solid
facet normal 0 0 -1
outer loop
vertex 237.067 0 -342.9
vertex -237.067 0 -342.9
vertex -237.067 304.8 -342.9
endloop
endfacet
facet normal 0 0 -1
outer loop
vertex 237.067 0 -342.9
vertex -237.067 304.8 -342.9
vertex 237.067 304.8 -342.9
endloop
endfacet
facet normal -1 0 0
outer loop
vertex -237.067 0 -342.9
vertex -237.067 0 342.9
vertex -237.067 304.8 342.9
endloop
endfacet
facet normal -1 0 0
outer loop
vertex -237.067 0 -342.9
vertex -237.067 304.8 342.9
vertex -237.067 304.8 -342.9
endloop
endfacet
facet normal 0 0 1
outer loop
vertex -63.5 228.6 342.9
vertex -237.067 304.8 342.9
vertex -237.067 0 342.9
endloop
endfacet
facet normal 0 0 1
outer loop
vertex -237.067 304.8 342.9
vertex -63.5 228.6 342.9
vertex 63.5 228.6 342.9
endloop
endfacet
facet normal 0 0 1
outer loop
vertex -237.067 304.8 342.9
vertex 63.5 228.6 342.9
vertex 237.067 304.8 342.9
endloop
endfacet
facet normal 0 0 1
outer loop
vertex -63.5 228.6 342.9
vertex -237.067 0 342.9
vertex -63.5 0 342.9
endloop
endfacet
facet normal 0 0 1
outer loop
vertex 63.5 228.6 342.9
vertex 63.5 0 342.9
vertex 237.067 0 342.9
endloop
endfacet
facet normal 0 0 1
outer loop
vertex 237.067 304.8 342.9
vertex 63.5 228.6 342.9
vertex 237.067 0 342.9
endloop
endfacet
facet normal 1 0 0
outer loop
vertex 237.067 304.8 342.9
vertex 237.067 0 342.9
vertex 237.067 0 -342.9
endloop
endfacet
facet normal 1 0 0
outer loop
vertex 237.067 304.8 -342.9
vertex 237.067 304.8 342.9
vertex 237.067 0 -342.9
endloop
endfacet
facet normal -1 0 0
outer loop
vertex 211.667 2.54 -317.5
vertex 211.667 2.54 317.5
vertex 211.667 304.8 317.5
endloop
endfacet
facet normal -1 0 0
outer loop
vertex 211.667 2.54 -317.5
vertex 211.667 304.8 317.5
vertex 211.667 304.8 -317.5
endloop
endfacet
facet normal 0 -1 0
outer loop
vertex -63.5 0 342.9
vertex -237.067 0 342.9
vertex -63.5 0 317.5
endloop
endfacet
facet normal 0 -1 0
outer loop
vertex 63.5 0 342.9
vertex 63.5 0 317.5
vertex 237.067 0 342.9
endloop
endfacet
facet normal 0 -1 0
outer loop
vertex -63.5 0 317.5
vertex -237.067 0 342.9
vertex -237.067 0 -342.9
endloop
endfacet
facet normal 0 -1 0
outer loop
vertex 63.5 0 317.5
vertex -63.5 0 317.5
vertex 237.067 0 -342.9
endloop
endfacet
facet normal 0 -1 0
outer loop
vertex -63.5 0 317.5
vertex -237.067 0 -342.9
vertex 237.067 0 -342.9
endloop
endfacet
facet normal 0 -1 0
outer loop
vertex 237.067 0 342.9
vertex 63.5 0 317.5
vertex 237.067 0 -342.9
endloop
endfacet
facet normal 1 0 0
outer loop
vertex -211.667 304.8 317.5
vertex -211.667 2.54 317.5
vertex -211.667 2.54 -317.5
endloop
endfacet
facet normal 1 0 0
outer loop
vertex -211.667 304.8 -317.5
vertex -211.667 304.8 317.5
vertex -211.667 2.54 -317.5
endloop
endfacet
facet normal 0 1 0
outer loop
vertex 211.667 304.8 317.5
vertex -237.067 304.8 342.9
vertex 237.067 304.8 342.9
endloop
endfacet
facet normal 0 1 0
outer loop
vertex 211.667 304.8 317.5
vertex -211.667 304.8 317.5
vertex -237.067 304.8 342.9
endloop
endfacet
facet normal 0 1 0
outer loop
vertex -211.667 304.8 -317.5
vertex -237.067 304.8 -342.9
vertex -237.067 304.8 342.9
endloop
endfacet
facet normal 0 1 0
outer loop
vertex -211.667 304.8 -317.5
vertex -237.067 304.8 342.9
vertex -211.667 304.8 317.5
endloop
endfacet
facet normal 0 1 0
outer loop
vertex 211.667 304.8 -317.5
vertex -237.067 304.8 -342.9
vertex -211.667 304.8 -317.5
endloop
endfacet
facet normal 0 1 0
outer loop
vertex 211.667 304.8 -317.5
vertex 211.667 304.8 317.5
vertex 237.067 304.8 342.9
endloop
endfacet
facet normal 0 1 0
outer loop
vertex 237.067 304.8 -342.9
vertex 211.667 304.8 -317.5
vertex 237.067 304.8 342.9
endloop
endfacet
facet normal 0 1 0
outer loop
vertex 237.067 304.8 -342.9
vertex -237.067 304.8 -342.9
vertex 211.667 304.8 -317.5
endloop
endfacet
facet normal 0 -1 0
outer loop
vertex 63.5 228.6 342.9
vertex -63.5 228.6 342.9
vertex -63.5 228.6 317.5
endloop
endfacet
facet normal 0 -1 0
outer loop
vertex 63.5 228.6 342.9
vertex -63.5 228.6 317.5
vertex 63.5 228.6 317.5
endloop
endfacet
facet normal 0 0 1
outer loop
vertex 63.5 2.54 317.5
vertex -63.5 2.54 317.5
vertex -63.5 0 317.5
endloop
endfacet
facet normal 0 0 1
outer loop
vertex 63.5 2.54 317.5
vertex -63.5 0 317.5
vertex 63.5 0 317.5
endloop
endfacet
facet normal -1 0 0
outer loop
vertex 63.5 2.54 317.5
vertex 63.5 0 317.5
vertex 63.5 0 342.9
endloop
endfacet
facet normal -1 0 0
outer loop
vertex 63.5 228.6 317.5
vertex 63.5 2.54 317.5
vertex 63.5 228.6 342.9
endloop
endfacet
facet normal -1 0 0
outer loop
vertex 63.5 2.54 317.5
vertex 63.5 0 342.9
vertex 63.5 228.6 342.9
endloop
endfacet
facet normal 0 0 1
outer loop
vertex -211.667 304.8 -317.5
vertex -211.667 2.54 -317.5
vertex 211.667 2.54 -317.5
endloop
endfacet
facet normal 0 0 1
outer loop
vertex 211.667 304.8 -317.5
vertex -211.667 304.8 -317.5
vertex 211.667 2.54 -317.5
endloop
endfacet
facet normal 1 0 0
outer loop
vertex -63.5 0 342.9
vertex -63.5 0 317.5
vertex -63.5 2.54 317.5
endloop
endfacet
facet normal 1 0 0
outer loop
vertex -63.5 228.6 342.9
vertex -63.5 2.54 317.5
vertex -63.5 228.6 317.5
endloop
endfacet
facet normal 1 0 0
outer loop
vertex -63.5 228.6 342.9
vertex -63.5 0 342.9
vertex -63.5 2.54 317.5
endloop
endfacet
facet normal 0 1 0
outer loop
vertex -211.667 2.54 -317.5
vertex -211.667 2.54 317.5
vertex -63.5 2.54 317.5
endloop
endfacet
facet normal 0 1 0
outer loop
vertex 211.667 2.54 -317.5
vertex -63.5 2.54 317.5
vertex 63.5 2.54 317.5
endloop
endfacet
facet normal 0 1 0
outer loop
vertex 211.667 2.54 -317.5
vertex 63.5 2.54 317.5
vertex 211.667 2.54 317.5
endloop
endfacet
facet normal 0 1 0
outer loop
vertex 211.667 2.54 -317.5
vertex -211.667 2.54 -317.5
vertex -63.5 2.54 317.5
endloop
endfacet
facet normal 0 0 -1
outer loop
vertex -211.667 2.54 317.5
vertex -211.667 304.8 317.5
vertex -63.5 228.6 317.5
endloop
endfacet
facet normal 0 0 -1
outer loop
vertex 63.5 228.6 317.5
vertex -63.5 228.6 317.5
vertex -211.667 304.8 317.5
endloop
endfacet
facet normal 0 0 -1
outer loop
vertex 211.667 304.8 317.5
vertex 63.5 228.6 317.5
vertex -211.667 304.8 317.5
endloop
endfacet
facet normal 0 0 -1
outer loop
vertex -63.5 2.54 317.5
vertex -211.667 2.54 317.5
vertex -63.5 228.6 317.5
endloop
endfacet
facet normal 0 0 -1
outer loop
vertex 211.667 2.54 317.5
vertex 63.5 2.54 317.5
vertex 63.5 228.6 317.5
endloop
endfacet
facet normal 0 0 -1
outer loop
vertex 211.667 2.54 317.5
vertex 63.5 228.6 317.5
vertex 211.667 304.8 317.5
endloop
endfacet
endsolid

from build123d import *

# Parameters (mm, degrees)
SKETCH1_W           = 474.133333334
SKETCH1_H           = 685.8
SKETCH1_W_2         = 423.333333334
SKETCH1_H_2         = 635
EXTRUDE_THIN1_DEPTH = 304.8
SKETCH1_2_W         = 423.333333334
SKETCH1_2_H         = 635
BOSS_EXTRUDE1_DEPTH = 2.54
SKETCH2_W           = 127
SKETCH2_H           = 228.6
CUT_EXTRUDE1_DEPTH  = 25.4


with BuildPart() as part:
    # Sketch1 → Extrude-Thin1 (new body)
    with BuildSketch(Plane(origin=(0, 0, 0), x_dir=(1, 0, 0), z_dir=(0, 1, 0))):
        Rectangle(SKETCH1_W, SKETCH1_H)
        Rectangle(SKETCH1_W_2, SKETCH1_H_2, mode=Mode.SUBTRACT)
    extrude(amount=EXTRUDE_THIN1_DEPTH)

    # Sketch1<2> → Boss-Extrude1 (add)
    with BuildSketch(Plane(origin=(0, 0, 0), x_dir=(1, 0, 0), z_dir=(0, 1, 0))):
        Rectangle(SKETCH1_2_W, SKETCH1_2_H)
    extrude(amount=BOSS_EXTRUDE1_DEPTH)

    # Sketch2 → Cut-Extrude1 (cut)
    with BuildSketch(Plane.XY.offset(342.9)):
        with Locations((0, 114.3)):
            Rectangle(SKETCH2_W, SKETCH2_H)
    extrude(amount=-CUT_EXTRUDE1_DEPTH, mode=Mode.SUBTRACT)


solid = part.part
